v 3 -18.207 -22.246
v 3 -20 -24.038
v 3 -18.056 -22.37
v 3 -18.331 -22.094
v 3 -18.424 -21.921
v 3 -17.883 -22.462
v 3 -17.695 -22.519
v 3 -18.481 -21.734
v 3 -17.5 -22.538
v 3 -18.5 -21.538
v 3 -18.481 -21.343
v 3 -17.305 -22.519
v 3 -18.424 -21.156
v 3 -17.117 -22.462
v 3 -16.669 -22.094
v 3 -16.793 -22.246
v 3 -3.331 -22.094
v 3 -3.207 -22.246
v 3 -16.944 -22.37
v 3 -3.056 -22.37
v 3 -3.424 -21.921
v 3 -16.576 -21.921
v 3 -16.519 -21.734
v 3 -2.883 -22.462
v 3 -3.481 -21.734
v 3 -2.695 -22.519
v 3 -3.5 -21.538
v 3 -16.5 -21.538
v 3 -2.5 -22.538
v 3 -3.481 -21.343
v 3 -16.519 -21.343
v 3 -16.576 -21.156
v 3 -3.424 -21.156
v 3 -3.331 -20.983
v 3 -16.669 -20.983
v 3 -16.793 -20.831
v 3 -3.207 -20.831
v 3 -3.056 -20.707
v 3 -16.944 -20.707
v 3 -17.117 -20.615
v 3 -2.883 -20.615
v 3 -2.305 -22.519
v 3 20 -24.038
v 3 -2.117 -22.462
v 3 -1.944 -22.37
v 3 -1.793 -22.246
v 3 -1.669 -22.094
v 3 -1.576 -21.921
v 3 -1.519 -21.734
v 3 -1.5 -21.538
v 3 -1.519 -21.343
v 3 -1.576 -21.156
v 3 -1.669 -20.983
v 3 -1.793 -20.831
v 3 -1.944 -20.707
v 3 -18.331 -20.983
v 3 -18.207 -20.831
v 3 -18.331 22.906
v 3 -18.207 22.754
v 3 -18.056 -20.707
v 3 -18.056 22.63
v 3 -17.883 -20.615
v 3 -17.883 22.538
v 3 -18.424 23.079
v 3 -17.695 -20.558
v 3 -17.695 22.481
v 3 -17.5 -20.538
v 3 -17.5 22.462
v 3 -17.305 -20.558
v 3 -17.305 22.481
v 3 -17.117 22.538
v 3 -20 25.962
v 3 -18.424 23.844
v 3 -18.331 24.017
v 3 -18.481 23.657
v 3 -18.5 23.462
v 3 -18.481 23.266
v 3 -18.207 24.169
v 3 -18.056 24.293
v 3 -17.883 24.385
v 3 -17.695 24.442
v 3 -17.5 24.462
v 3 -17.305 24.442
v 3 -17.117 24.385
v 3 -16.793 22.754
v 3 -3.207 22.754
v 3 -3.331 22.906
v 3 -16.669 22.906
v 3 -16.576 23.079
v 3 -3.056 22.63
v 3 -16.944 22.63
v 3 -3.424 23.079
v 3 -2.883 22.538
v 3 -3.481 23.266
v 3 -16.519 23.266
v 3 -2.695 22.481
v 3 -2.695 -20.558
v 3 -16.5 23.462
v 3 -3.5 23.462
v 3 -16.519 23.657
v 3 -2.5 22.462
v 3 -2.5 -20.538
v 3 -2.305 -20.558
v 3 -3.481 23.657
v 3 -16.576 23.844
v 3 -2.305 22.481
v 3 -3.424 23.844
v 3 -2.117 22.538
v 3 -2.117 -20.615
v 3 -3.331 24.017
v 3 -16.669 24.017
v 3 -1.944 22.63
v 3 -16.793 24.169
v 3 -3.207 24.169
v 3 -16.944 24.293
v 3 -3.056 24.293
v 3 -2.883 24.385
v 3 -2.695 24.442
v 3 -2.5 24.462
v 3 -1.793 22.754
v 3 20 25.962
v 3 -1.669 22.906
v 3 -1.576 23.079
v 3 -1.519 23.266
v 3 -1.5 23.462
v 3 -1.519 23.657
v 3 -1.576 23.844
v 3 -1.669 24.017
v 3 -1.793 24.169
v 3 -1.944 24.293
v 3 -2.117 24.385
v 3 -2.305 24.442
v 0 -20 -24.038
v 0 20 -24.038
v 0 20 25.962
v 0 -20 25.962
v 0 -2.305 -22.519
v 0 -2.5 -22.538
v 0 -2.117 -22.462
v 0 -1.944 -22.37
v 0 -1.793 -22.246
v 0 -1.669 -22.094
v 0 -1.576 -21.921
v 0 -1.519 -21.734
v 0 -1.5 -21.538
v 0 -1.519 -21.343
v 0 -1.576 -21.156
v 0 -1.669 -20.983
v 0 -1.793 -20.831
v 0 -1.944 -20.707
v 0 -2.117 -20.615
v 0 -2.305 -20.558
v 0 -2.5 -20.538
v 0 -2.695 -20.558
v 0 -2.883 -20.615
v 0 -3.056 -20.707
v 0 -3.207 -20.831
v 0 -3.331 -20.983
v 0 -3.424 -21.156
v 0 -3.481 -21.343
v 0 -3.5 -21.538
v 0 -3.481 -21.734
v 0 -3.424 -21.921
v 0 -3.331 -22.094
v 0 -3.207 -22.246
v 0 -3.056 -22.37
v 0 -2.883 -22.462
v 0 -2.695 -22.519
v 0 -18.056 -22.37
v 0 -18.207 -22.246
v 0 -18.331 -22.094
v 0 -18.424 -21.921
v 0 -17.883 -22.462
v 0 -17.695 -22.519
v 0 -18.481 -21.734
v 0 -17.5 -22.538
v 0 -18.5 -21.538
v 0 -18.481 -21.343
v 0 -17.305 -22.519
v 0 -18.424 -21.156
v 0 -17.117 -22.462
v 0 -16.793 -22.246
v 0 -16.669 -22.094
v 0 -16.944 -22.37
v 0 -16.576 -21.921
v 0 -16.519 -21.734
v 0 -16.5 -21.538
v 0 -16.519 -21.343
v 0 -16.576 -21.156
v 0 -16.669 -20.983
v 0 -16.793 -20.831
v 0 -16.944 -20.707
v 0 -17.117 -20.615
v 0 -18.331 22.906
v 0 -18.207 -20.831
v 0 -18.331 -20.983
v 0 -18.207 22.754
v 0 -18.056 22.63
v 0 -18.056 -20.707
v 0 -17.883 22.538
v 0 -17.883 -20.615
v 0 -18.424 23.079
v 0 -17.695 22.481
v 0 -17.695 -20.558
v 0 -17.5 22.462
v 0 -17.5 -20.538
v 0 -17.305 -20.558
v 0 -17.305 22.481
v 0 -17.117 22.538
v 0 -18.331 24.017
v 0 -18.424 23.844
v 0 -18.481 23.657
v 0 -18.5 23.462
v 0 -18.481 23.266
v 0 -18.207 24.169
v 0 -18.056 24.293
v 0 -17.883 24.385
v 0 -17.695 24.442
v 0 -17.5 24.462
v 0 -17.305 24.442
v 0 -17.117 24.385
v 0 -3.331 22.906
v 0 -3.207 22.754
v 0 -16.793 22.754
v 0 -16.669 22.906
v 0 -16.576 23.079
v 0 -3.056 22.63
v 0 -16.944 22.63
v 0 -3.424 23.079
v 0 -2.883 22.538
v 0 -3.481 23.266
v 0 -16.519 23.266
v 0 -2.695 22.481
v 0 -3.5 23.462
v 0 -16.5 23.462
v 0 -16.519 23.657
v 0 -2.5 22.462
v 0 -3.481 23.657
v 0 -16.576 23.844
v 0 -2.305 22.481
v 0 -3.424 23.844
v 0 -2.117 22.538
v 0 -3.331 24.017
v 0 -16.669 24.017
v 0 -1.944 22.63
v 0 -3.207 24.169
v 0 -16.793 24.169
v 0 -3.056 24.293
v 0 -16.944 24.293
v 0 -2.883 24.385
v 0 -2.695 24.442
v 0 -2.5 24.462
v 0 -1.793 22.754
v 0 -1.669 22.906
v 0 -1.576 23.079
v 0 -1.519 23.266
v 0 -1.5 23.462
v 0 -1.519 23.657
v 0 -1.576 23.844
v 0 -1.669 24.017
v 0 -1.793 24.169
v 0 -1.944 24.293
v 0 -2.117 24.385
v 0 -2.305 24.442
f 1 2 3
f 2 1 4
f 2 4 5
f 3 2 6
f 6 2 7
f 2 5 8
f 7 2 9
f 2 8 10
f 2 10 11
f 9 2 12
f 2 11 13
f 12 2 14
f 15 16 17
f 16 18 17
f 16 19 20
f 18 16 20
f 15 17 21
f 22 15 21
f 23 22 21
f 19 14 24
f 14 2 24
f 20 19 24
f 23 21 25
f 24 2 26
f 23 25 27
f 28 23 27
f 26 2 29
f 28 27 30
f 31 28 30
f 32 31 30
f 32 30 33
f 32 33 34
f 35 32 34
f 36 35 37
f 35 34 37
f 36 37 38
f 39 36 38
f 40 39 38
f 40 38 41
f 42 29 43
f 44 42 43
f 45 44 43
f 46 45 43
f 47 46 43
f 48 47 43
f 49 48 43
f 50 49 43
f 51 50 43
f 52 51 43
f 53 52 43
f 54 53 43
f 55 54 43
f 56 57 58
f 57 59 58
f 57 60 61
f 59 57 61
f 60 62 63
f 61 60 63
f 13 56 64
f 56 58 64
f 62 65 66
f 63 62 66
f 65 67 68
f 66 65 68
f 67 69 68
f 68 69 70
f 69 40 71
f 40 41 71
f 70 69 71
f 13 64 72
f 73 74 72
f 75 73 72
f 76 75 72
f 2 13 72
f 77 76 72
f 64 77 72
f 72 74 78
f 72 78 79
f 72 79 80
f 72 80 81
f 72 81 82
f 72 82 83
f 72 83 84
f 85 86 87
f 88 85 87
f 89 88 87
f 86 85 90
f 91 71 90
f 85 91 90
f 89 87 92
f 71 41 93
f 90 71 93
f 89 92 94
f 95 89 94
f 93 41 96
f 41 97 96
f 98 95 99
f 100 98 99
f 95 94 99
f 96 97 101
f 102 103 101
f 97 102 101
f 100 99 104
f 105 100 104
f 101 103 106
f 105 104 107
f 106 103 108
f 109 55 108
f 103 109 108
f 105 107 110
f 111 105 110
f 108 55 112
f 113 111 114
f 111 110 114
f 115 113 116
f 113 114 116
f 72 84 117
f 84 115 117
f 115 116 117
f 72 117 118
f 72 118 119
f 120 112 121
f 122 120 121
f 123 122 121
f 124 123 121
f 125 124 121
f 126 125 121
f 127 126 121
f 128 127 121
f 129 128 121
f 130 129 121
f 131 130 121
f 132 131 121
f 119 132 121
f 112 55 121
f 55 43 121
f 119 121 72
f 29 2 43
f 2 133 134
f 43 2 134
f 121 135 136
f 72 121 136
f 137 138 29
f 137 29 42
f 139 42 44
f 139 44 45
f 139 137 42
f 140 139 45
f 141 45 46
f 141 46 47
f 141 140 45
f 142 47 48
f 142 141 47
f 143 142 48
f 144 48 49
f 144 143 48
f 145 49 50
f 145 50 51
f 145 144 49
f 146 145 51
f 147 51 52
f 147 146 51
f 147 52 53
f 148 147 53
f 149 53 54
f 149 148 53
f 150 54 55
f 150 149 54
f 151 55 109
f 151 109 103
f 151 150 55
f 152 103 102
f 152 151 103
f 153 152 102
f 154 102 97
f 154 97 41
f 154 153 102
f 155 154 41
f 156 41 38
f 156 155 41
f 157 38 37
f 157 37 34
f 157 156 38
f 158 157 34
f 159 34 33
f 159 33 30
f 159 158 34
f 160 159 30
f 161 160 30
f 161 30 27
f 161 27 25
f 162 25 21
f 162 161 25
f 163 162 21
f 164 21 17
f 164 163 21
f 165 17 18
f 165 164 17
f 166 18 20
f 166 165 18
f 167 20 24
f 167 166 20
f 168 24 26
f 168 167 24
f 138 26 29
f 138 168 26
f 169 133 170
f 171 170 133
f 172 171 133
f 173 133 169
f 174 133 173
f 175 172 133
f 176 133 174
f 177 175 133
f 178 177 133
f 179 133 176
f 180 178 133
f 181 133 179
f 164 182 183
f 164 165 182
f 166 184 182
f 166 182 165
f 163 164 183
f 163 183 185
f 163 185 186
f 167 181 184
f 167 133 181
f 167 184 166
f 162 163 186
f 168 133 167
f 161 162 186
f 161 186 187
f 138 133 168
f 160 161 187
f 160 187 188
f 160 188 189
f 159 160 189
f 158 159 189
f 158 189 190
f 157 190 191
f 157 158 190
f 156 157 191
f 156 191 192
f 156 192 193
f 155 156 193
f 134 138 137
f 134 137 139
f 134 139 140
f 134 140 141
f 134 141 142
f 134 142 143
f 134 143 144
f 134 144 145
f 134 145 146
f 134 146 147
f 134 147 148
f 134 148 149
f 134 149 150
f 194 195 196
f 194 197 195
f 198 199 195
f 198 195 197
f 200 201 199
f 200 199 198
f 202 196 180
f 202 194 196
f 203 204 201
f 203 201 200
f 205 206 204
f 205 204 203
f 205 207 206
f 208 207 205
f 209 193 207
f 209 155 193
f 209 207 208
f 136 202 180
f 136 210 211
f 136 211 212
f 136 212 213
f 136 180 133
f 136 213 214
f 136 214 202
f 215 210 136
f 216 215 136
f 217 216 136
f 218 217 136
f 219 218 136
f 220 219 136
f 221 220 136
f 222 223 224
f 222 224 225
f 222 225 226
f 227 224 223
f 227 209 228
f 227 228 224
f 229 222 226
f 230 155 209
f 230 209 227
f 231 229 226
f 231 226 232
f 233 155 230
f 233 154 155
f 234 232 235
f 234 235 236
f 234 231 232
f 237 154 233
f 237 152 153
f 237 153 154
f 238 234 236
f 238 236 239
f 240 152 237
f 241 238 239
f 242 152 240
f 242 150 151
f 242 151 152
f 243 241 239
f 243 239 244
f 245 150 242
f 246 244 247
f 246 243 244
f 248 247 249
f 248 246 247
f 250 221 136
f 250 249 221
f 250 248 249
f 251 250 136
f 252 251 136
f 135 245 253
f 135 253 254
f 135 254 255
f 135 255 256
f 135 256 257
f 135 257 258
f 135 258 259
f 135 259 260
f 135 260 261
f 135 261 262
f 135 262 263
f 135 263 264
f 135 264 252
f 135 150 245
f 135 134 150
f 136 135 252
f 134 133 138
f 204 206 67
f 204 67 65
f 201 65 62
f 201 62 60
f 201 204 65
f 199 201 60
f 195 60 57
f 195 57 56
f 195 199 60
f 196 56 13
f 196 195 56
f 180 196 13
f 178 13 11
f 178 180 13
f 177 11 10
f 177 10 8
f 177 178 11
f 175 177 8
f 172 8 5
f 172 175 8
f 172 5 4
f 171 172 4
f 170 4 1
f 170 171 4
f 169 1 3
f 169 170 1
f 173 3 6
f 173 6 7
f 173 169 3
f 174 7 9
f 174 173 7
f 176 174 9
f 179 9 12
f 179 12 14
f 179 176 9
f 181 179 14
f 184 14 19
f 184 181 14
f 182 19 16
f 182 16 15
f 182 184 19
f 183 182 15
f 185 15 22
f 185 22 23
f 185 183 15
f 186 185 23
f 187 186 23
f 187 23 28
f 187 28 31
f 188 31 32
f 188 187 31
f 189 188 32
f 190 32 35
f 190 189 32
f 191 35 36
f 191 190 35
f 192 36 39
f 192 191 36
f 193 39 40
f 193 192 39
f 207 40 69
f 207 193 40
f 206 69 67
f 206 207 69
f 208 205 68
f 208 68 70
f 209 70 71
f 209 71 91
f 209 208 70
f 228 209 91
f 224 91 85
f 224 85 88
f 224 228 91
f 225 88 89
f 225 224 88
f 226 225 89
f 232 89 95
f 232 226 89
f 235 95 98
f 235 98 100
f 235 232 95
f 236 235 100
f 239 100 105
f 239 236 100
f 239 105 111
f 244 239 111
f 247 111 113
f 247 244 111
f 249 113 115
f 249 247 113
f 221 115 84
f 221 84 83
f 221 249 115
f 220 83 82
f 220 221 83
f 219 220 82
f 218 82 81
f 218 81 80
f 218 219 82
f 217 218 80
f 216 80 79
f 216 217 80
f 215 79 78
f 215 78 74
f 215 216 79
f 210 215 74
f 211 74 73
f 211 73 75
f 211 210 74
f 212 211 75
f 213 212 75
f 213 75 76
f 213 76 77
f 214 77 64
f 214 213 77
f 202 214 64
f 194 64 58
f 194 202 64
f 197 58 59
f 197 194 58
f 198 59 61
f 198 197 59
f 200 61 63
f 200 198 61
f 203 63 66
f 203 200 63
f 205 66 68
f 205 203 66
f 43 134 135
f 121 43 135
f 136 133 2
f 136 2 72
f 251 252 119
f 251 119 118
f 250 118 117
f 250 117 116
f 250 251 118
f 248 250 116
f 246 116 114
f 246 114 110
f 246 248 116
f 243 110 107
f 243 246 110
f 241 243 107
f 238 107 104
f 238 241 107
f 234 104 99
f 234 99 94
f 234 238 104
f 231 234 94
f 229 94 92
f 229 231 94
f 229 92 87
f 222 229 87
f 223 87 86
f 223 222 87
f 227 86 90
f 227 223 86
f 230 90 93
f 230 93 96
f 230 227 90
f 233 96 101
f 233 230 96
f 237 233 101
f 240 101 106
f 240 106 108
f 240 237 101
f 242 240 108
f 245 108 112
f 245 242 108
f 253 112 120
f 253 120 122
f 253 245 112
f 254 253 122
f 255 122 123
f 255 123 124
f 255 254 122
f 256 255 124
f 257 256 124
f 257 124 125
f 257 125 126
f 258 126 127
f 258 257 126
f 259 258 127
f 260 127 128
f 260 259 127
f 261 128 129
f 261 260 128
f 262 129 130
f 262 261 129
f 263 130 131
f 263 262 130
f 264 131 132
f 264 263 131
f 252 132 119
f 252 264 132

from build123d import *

# Parameters (mm, degrees)
CROQUIS1_R              = 1
SALIENTE_EXTRUIR3_DEPTH = 3


with BuildPart() as part:
    # Croquis1 → Saliente-Extruir3 (new body)
    with BuildSketch(Plane(origin=(0, 0, 0), x_dir=(0, 0, -1), z_dir=(1, 0, 0))):
        Polygon((-25.961538462, 0), (-25.961538462, 20), (-0.961538462, 20), (24.038461538, 20), (24.038461538, 0), (24.038461538, -20), (-25.961538462, -20), align=None)
        with Locations((-23.461538462, -17.5)):
            Circle(CROQUIS1_R, mode=Mode.SUBTRACT)
        with Locations(Location((21.538461538, -17.5, 0), (0, 0, 180))):
            Circle(CROQUIS1_R, mode=Mode.SUBTRACT)
        with Locations((21.538461538, -2.5)):
            Circle(CROQUIS1_R, mode=Mode.SUBTRACT)
        with Locations(Location((-23.461538462, -2.5, 0), (0, 0, 180))):
            Circle(CROQUIS1_R, mode=Mode.SUBTRACT)
    extrude(amount=SALIENTE_EXTRUIR3_DEPTH)


solid = part.part
